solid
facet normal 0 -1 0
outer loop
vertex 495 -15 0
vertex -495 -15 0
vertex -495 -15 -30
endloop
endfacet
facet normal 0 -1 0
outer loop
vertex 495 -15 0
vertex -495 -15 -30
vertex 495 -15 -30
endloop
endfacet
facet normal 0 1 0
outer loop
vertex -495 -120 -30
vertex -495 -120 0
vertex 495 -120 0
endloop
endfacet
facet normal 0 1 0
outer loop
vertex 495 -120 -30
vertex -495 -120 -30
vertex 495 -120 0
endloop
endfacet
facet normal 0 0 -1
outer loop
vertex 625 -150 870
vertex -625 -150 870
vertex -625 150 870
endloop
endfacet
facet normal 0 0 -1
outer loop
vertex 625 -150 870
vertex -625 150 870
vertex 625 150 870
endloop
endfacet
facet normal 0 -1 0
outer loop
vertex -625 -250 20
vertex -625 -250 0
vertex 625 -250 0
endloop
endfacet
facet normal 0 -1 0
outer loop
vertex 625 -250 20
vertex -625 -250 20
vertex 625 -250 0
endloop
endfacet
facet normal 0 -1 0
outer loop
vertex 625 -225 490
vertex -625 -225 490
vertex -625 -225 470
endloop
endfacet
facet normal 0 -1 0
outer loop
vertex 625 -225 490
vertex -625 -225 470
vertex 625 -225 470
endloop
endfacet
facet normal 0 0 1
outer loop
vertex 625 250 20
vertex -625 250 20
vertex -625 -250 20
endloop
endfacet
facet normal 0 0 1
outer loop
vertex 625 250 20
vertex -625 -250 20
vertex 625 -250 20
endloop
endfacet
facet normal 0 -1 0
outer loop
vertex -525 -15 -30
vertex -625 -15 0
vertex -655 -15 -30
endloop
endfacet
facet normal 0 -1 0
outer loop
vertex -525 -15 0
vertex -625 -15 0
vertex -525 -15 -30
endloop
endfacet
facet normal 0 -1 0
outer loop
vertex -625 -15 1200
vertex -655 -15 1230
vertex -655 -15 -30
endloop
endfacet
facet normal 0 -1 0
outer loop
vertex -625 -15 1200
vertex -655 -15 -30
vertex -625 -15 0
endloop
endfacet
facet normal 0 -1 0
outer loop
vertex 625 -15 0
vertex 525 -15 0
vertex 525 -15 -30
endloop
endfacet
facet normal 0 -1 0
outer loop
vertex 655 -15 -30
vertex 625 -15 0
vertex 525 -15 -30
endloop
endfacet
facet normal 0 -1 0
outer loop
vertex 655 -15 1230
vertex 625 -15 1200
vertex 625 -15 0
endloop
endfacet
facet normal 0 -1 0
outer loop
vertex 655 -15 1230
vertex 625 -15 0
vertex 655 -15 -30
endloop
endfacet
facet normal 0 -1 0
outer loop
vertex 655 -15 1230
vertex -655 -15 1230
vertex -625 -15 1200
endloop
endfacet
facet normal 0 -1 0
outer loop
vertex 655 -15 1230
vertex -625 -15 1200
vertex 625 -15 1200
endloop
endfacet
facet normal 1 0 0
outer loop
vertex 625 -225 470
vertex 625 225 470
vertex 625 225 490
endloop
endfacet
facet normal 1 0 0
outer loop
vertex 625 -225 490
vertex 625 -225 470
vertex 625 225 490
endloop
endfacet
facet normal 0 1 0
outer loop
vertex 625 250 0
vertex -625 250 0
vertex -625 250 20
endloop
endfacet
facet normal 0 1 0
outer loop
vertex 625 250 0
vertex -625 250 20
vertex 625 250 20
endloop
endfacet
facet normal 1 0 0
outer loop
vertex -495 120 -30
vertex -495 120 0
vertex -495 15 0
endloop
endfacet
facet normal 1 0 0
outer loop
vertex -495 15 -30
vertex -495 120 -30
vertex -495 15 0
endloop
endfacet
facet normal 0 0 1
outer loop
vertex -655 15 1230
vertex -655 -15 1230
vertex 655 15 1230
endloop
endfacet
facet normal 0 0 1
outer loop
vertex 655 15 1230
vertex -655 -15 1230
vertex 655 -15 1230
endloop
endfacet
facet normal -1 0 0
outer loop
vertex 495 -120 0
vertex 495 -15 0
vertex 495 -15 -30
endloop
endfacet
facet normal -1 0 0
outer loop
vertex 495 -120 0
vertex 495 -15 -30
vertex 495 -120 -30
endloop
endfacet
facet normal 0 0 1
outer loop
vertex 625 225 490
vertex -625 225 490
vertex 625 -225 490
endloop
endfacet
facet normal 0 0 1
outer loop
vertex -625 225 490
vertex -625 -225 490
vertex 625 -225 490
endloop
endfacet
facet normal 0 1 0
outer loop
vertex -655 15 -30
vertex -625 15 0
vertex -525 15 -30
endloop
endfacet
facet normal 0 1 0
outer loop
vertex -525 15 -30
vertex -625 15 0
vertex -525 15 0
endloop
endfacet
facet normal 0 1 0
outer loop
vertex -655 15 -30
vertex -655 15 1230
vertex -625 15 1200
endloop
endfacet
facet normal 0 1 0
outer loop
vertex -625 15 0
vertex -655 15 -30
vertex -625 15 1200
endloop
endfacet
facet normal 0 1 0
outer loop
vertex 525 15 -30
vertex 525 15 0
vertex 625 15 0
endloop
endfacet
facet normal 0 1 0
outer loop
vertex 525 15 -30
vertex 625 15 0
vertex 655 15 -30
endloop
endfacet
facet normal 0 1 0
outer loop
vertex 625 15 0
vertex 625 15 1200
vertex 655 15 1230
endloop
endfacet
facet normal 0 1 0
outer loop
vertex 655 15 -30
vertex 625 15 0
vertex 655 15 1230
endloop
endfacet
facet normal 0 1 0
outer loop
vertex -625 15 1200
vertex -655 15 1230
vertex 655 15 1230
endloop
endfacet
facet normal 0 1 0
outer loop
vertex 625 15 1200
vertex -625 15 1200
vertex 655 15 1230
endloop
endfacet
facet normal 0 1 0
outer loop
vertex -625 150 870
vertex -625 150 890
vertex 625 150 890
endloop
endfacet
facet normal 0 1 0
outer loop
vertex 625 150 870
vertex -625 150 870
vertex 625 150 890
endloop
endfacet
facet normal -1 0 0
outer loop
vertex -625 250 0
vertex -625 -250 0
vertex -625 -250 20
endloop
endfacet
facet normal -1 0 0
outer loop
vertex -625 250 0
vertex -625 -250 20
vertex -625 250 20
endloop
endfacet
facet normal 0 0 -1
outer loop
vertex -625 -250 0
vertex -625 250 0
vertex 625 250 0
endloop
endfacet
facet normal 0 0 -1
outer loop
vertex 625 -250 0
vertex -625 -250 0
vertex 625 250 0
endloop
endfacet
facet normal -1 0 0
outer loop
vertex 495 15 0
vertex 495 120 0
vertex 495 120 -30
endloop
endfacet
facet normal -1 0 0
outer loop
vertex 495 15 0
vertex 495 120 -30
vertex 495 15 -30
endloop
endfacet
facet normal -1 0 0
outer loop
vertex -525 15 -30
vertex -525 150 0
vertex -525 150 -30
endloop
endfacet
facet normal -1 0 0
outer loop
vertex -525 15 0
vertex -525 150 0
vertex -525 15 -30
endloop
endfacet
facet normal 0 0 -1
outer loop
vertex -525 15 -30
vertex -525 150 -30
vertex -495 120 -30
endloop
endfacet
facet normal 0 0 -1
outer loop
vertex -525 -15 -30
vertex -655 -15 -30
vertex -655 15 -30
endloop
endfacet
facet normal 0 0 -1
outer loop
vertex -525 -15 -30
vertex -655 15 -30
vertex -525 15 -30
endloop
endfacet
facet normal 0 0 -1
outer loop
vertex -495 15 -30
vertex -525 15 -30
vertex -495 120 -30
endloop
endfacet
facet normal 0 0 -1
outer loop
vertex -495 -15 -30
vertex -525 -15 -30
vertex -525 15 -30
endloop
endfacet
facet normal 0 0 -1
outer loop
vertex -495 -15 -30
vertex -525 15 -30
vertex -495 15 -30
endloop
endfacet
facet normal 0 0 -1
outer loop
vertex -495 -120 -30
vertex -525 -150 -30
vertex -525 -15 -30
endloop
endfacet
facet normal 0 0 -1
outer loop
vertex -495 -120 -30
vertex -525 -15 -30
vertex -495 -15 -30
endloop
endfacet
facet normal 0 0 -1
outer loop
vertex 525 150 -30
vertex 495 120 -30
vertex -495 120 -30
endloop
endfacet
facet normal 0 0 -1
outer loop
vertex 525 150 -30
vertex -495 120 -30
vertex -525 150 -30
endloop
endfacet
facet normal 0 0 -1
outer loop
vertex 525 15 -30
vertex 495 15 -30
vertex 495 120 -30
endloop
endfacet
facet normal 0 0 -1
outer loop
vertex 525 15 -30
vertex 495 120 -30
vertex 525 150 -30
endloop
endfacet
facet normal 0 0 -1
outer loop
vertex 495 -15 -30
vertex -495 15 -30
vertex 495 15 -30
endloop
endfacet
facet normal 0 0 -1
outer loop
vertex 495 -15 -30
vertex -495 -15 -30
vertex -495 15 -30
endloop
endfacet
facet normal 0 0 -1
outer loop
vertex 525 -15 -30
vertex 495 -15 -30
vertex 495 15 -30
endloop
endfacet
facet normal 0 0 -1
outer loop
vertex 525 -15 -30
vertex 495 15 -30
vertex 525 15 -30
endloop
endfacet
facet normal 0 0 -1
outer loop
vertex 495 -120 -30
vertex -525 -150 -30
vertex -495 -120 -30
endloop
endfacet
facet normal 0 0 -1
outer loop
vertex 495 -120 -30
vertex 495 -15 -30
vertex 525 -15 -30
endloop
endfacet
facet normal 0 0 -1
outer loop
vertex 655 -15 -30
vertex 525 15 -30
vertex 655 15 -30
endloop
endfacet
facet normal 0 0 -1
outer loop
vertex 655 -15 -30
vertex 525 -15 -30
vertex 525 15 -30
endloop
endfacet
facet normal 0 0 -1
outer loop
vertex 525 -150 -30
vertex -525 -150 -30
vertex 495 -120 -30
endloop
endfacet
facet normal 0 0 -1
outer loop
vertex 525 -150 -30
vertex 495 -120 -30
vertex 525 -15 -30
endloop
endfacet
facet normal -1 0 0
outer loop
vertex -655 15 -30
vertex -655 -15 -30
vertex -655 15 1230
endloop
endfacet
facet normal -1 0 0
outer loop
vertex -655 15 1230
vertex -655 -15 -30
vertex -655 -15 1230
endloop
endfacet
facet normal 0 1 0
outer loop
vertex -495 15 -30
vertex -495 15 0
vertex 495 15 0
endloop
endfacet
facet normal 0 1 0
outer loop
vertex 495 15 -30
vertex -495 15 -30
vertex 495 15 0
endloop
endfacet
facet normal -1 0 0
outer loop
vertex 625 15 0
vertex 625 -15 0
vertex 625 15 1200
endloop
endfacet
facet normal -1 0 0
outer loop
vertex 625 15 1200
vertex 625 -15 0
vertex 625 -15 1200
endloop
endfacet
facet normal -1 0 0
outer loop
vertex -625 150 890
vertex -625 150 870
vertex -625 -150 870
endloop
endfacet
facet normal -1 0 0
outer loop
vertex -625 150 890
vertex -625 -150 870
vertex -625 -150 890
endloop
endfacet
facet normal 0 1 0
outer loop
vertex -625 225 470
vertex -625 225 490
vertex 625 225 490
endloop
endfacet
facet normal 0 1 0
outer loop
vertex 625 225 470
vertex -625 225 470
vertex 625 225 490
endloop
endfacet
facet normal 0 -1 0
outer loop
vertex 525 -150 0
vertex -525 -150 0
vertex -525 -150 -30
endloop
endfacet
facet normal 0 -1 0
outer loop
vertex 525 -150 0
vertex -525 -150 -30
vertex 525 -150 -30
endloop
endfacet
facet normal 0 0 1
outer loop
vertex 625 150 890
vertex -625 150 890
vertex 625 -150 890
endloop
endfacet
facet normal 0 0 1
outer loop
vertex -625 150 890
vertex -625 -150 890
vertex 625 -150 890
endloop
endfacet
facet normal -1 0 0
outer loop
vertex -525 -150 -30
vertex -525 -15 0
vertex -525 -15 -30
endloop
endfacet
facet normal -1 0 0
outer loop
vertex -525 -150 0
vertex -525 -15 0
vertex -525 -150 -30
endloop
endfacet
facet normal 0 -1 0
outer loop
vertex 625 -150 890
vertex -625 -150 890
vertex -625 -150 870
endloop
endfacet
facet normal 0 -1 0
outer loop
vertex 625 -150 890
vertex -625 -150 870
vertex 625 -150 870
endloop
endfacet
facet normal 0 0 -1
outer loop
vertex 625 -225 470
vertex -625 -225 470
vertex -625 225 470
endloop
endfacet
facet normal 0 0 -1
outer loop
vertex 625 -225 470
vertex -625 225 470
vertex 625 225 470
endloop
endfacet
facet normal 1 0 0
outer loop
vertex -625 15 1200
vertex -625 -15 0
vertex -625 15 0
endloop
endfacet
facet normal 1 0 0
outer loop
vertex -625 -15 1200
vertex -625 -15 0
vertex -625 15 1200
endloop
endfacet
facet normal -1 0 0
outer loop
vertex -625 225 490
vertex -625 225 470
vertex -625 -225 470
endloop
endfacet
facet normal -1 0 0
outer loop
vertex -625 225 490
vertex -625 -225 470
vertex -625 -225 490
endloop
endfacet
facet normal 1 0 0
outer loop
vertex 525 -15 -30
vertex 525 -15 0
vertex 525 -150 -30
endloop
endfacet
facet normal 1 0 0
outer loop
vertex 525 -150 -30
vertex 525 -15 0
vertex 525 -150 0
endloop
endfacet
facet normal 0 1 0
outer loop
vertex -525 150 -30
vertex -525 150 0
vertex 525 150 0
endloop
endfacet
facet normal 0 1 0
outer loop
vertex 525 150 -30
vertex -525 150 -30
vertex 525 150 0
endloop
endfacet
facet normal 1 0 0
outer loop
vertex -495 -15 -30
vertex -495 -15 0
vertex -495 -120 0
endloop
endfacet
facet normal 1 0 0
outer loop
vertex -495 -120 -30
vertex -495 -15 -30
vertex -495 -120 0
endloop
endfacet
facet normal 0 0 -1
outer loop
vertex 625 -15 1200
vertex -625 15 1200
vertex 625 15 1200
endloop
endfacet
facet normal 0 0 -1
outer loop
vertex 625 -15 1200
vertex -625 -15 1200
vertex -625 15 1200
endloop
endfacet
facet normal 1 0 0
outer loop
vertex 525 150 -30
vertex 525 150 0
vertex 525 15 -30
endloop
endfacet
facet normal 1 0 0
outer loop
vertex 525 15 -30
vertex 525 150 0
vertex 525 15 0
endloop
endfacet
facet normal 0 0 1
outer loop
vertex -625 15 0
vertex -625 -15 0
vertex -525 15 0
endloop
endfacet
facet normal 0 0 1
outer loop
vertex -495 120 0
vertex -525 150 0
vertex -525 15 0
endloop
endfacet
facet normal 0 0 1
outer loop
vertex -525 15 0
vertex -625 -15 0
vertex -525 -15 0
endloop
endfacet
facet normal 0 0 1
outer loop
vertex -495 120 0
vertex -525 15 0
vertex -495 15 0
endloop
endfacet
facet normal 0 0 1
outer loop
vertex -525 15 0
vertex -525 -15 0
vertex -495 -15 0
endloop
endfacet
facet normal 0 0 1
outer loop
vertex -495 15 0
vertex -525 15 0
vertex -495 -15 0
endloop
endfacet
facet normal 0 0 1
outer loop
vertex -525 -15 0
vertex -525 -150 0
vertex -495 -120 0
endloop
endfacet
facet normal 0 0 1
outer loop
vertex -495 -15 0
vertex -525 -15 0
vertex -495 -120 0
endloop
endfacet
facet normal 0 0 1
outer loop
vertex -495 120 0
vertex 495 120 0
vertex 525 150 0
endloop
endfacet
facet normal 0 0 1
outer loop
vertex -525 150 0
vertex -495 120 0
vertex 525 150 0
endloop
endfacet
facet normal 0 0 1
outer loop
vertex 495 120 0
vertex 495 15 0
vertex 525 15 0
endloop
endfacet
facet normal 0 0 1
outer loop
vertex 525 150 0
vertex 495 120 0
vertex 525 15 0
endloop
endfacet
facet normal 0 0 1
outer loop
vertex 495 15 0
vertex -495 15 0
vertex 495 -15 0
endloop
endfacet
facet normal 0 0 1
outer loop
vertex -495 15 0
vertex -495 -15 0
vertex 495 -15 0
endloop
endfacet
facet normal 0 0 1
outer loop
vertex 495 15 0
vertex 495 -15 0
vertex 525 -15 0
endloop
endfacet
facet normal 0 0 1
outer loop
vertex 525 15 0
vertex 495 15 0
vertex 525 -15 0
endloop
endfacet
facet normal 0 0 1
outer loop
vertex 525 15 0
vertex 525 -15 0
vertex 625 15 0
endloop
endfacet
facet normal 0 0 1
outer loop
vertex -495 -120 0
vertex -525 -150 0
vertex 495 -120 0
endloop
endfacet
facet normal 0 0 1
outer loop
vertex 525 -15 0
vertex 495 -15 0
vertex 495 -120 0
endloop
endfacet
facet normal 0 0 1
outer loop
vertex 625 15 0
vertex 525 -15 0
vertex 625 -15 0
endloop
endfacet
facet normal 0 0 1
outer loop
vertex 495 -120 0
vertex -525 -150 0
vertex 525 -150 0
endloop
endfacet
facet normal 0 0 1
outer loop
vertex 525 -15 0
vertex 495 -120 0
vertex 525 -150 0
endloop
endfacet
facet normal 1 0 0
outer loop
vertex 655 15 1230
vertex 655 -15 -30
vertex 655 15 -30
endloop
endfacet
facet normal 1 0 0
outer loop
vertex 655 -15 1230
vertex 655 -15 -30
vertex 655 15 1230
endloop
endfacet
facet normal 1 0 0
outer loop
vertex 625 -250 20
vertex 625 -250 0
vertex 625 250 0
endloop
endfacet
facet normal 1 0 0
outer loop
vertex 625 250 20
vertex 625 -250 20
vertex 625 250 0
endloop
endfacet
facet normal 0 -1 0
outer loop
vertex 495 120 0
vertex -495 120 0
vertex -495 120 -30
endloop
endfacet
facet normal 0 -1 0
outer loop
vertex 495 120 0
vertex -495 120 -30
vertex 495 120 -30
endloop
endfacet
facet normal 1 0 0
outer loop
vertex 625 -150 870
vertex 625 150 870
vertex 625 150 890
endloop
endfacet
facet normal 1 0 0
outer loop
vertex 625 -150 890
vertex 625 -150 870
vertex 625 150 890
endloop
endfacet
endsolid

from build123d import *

# Parameters (mm, degrees)
F0_W     = 1250
F0_H     = 500
F1_DEPTH = 20
F2_W     = 1310
F2_H     = 1260
F2_W_2   = 1250
F2_H_2   = 1200
F3_DEPTH = 15
F4_W     = 1050
F4_H     = 300
F4_W_2   = 990
F4_H_2   = 240
F5_DEPTH = 30
F6_W     = 1250
F6_H     = 20
F7_DEPTH = 150
F8_W     = 1250
F8_H     = 20
F9_DEPTH = 225


with BuildPart() as f1:
    # F0 (on Top) → F1 (new body)
    with BuildSketch(Plane.XY):
        Rectangle(F0_W, F0_H)
    extrude(amount=F1_DEPTH)


with BuildPart() as f3:
    # F2 (on Front) → F3 (new body, symmetric)
    with BuildSketch(Plane.XZ):
        with Locations((0, 600)):
            Rectangle(F2_W, F2_H)
        with Locations((0, 600)):
            Rectangle(F2_W_2, F2_H_2, mode=Mode.SUBTRACT)
    extrude(amount=F3_DEPTH, both=True)

    # F4 (on face) → F5 (join)
    with BuildSketch(Plane(origin=(0, 0, 0), x_dir=(1, 0, 0), z_dir=(0, 0, -1))):
        Rectangle(F4_W, F4_H)
        Rectangle(F4_W_2, F4_H_2, mode=Mode.SUBTRACT)
    extrude(amount=F5_DEPTH)


with BuildPart() as f7:
    # F6 (on Front) → F7 (new body, symmetric)
    with BuildSketch(Plane.XZ):
        with Locations((0, 880)):
            Rectangle(F6_W, F6_H)
    extrude(amount=F7_DEPTH, both=True)


with BuildPart() as f9:
    # F8 (on Front) → F9 (new body, symmetric)
    with BuildSketch(Plane.XZ):
        with Locations((0, 480)):
            Rectangle(F8_W, F8_H)
    extrude(amount=F9_DEPTH, both=True)


solid = Compound([f1.part, f3.part, f7.part, f9.part])
